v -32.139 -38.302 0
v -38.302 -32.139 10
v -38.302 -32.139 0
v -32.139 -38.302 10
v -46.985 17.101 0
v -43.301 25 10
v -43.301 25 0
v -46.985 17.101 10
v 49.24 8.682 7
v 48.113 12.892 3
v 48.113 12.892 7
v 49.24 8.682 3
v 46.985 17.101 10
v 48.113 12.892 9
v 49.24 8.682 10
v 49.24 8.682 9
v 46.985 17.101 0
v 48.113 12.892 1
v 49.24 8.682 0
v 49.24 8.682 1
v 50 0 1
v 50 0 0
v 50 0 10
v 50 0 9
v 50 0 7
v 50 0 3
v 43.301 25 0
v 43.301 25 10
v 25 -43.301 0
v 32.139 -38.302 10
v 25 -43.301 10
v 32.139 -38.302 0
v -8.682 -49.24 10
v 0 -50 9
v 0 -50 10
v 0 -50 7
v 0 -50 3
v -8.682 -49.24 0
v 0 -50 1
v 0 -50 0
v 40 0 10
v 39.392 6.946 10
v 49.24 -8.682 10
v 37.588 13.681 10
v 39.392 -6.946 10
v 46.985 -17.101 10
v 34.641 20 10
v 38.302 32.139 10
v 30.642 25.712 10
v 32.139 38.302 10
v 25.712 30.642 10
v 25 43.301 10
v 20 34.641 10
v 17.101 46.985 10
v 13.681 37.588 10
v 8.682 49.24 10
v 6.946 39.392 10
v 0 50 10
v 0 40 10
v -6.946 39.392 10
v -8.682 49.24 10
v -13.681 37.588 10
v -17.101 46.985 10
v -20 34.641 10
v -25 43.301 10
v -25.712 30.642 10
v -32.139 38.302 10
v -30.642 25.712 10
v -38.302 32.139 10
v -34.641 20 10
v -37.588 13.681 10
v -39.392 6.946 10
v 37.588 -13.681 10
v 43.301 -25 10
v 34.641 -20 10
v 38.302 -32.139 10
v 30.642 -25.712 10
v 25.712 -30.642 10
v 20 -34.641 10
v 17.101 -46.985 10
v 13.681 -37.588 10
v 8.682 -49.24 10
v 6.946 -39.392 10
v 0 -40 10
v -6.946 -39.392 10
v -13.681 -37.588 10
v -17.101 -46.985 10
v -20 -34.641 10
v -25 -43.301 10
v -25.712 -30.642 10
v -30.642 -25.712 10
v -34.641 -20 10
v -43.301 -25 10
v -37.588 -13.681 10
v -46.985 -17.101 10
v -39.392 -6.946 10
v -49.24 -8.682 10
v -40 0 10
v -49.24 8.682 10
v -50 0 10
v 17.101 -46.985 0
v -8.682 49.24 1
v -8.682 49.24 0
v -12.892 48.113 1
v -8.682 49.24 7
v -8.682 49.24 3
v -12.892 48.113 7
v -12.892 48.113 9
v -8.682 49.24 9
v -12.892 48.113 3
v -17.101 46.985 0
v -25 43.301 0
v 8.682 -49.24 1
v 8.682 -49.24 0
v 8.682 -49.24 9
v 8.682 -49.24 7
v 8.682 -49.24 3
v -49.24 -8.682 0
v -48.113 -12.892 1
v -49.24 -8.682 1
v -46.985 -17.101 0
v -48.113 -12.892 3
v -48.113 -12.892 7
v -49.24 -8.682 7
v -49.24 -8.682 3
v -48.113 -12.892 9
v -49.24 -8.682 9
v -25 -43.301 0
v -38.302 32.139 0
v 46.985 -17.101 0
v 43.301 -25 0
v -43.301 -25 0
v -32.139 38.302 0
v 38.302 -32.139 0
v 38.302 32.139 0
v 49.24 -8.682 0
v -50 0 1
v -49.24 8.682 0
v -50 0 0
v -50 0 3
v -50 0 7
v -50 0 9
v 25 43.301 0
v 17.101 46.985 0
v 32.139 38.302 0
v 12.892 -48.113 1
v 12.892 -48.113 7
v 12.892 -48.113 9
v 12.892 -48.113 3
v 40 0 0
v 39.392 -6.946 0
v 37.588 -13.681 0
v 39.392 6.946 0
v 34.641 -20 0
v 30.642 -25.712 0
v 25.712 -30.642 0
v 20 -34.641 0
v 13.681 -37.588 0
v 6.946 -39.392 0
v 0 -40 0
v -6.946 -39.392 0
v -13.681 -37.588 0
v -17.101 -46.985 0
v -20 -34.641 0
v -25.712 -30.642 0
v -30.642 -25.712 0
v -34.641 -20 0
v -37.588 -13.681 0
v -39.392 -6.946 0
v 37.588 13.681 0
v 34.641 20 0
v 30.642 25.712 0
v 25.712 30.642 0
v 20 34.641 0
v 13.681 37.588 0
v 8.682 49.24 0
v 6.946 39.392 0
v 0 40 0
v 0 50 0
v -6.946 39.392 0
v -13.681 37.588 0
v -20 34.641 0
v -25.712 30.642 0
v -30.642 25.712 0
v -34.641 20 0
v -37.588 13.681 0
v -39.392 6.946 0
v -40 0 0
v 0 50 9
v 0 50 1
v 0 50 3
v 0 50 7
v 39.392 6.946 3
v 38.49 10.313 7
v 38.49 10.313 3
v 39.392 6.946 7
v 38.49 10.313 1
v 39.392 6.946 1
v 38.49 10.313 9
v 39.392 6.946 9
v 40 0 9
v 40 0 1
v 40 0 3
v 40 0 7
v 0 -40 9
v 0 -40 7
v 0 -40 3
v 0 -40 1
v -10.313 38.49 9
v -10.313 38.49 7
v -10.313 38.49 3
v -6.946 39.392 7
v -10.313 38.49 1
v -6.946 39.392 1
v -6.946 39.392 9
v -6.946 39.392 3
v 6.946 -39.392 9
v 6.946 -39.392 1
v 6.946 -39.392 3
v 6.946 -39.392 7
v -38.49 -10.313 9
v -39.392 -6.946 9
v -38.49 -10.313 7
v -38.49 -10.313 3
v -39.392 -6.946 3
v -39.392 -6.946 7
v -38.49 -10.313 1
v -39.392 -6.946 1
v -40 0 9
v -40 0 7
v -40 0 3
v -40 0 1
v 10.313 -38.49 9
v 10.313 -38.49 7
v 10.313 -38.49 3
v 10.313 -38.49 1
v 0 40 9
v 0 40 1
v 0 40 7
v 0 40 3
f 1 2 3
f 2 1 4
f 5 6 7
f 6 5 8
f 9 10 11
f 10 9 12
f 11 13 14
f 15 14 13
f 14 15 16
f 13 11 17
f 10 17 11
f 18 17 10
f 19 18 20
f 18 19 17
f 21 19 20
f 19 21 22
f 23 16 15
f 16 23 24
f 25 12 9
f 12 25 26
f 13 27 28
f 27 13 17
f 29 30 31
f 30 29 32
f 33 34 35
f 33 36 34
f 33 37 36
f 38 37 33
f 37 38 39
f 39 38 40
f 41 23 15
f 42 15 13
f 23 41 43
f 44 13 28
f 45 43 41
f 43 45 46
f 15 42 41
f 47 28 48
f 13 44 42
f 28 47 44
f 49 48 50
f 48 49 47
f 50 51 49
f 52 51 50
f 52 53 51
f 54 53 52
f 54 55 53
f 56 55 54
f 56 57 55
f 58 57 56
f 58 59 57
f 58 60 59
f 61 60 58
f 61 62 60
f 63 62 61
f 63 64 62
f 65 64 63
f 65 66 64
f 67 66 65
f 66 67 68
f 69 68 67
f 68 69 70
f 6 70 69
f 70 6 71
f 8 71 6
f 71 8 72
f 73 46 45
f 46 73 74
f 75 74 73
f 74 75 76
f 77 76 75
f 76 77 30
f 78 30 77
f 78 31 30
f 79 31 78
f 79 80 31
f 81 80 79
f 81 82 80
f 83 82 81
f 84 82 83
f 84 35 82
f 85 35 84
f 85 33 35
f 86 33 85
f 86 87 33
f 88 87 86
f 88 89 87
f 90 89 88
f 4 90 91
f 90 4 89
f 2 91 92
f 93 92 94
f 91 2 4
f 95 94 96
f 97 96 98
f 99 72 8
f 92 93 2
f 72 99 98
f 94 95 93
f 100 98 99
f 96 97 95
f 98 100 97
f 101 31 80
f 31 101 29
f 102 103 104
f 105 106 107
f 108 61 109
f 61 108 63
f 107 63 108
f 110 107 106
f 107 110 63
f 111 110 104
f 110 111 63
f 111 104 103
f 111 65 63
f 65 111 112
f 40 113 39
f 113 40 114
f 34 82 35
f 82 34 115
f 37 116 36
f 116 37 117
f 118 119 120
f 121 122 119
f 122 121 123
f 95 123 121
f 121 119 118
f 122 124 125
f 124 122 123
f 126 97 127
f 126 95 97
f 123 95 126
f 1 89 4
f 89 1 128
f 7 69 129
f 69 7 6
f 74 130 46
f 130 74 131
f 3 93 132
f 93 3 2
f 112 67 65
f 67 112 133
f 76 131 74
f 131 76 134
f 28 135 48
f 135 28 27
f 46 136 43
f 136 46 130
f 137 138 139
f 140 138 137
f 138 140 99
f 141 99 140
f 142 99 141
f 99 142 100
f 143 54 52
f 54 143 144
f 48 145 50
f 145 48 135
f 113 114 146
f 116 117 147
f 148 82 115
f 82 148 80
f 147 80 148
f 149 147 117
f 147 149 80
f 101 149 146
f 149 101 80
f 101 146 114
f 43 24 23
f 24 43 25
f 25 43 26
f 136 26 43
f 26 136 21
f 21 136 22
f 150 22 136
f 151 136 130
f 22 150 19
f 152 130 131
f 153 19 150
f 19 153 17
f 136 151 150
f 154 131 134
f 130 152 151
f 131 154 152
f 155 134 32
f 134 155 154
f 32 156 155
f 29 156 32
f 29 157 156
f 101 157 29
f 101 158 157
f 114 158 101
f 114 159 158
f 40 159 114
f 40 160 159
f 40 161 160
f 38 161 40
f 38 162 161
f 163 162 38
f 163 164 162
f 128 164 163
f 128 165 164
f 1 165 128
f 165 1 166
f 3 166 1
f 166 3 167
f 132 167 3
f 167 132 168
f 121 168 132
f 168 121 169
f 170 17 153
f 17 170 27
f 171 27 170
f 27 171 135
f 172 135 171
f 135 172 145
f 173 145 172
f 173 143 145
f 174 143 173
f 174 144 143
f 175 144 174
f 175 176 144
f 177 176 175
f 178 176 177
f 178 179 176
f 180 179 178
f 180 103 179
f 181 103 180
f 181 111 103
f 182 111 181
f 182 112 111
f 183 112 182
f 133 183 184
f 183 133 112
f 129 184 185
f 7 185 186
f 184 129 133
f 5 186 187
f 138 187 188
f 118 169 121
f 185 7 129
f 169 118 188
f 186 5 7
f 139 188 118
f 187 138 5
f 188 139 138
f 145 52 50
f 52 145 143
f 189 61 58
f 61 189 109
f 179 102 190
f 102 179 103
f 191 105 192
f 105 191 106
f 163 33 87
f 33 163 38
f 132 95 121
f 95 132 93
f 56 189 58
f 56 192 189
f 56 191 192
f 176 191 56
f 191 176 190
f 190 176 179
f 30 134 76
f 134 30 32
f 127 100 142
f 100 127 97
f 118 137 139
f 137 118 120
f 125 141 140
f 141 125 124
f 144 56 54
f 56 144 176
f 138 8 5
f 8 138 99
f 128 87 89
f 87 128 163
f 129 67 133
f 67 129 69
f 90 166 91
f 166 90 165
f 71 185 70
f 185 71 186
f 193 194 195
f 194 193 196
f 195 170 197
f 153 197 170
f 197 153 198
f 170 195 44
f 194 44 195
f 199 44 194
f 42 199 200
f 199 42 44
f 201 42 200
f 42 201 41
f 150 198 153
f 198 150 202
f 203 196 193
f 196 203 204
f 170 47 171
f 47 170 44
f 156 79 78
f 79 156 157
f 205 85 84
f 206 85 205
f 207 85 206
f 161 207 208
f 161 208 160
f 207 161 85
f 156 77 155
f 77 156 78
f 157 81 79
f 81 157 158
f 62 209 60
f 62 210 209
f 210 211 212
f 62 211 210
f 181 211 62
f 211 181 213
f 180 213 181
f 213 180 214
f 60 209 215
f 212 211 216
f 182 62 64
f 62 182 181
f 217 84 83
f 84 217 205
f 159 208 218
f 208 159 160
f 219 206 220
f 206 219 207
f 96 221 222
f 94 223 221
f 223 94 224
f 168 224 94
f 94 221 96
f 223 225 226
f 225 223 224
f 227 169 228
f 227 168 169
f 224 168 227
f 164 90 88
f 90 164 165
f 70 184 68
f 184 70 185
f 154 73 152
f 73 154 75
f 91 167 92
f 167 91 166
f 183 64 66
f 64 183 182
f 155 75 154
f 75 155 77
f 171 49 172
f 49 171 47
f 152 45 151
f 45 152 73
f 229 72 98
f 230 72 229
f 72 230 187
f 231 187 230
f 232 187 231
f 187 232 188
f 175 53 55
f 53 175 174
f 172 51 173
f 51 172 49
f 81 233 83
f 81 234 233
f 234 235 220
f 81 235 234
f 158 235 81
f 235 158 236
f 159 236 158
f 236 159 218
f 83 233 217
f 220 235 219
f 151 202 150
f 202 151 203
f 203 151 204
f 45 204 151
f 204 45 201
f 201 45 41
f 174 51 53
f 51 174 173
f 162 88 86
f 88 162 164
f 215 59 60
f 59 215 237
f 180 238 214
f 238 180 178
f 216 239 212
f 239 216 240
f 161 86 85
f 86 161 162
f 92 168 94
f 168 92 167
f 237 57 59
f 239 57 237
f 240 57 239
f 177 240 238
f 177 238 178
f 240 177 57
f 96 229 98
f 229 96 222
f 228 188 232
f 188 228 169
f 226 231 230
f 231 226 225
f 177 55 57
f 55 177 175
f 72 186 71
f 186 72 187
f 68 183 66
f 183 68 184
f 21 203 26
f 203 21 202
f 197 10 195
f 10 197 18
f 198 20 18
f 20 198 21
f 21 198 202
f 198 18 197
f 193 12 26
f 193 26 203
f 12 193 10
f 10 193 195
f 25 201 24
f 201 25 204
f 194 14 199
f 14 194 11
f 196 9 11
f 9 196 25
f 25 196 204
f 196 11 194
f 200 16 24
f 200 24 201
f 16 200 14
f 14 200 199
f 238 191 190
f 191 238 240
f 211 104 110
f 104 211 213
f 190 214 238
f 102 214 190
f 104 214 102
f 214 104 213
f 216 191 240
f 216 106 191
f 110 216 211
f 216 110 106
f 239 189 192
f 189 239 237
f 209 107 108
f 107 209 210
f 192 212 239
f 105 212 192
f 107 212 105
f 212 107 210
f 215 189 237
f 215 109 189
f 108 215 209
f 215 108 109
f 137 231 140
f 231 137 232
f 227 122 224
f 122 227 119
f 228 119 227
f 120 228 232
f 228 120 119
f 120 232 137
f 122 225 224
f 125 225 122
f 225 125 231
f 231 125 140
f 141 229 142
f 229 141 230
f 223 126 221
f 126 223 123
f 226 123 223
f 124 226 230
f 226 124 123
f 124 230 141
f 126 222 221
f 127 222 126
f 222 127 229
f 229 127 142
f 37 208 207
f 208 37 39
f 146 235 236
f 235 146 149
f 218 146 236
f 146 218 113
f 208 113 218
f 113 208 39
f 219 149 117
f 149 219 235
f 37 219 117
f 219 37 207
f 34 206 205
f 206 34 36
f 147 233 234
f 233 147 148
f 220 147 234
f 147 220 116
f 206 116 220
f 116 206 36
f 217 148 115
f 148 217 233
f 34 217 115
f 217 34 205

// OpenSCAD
// Fight the z. The magnitude doesn't affect the element count.
eps = 0.01;
// Big enough to cover the geometry. The magnitude doesn't affect the count.
inf = 1000;

extruded = false;

// Cylinder minus inner cylinder. This doesn't seem to be the problem (i.e.,
// it's as hard with just a cylinder); this is easier to visualize with the
// inside carved out.
module pipe(h, outer_r, inner_r) {
	difference() {
		cylinder(h=h, r=outer_r, $fa=10);
		translate([0, 0, -eps])
			cylinder(h=h+2*eps, r=inner_r, $fa=10);
	}
}

// A pizza slice is under 90 degrees big and exists in the first quadant. It
// lies on top of the x axis, grows counterclockwise.
module pizzamask(angle) {
	// linear_extrude makes the problem initially smaller, but the complexity
	// still grows exponentially
	if (!extruded) intersection() {
		// first quadrant
		translate([0, 0, -inf/2])
			cube([inf, inf, inf]);

		// from x axis ccw
		rotate([0, 0, angle - 90])
			translate([0, 0, -inf/2])
				cube([inf, inf, inf]);
	}
	else linear_extrude(height = inf) intersection() {
		square([inf, inf]);

		// from x axis ccw
		rotate([0, 0, angle - 90])
			square([inf, inf]);
	}
}

// a whole sector
module pizzaslice(h, r, angle) {
	render()
	intersection() {
		cylinder(h=h, r=r, $fa=10);
		pizzamask(angle);
	}
}

module holed_pizzacrust() {
	//union() { // visualize the subtraction elements
	difference() { // reproduce the problem
		pipe(10, 50, 40);
		// extruded: 0:0 -> 16, 0:1 -> 96, 0:2 -> 512, 0:3 -> 2560, 0:4 -> over 40000
		// !extruded: 0:0 -> 36, 0:1 -> 486, 0:2 -> 5832, 0:3 -> over 40000
		for (pos=[0:3]) {
			rotate([0, 0, pos*360/4]) {
				translate([0, 0, 1])
					pizzaslice(2, 50+eps, 15);
				translate([0, 0, 7])
					pizzaslice(2, 50+eps, 15);
			}
		}
	}
}

holed_pizzacrust();
